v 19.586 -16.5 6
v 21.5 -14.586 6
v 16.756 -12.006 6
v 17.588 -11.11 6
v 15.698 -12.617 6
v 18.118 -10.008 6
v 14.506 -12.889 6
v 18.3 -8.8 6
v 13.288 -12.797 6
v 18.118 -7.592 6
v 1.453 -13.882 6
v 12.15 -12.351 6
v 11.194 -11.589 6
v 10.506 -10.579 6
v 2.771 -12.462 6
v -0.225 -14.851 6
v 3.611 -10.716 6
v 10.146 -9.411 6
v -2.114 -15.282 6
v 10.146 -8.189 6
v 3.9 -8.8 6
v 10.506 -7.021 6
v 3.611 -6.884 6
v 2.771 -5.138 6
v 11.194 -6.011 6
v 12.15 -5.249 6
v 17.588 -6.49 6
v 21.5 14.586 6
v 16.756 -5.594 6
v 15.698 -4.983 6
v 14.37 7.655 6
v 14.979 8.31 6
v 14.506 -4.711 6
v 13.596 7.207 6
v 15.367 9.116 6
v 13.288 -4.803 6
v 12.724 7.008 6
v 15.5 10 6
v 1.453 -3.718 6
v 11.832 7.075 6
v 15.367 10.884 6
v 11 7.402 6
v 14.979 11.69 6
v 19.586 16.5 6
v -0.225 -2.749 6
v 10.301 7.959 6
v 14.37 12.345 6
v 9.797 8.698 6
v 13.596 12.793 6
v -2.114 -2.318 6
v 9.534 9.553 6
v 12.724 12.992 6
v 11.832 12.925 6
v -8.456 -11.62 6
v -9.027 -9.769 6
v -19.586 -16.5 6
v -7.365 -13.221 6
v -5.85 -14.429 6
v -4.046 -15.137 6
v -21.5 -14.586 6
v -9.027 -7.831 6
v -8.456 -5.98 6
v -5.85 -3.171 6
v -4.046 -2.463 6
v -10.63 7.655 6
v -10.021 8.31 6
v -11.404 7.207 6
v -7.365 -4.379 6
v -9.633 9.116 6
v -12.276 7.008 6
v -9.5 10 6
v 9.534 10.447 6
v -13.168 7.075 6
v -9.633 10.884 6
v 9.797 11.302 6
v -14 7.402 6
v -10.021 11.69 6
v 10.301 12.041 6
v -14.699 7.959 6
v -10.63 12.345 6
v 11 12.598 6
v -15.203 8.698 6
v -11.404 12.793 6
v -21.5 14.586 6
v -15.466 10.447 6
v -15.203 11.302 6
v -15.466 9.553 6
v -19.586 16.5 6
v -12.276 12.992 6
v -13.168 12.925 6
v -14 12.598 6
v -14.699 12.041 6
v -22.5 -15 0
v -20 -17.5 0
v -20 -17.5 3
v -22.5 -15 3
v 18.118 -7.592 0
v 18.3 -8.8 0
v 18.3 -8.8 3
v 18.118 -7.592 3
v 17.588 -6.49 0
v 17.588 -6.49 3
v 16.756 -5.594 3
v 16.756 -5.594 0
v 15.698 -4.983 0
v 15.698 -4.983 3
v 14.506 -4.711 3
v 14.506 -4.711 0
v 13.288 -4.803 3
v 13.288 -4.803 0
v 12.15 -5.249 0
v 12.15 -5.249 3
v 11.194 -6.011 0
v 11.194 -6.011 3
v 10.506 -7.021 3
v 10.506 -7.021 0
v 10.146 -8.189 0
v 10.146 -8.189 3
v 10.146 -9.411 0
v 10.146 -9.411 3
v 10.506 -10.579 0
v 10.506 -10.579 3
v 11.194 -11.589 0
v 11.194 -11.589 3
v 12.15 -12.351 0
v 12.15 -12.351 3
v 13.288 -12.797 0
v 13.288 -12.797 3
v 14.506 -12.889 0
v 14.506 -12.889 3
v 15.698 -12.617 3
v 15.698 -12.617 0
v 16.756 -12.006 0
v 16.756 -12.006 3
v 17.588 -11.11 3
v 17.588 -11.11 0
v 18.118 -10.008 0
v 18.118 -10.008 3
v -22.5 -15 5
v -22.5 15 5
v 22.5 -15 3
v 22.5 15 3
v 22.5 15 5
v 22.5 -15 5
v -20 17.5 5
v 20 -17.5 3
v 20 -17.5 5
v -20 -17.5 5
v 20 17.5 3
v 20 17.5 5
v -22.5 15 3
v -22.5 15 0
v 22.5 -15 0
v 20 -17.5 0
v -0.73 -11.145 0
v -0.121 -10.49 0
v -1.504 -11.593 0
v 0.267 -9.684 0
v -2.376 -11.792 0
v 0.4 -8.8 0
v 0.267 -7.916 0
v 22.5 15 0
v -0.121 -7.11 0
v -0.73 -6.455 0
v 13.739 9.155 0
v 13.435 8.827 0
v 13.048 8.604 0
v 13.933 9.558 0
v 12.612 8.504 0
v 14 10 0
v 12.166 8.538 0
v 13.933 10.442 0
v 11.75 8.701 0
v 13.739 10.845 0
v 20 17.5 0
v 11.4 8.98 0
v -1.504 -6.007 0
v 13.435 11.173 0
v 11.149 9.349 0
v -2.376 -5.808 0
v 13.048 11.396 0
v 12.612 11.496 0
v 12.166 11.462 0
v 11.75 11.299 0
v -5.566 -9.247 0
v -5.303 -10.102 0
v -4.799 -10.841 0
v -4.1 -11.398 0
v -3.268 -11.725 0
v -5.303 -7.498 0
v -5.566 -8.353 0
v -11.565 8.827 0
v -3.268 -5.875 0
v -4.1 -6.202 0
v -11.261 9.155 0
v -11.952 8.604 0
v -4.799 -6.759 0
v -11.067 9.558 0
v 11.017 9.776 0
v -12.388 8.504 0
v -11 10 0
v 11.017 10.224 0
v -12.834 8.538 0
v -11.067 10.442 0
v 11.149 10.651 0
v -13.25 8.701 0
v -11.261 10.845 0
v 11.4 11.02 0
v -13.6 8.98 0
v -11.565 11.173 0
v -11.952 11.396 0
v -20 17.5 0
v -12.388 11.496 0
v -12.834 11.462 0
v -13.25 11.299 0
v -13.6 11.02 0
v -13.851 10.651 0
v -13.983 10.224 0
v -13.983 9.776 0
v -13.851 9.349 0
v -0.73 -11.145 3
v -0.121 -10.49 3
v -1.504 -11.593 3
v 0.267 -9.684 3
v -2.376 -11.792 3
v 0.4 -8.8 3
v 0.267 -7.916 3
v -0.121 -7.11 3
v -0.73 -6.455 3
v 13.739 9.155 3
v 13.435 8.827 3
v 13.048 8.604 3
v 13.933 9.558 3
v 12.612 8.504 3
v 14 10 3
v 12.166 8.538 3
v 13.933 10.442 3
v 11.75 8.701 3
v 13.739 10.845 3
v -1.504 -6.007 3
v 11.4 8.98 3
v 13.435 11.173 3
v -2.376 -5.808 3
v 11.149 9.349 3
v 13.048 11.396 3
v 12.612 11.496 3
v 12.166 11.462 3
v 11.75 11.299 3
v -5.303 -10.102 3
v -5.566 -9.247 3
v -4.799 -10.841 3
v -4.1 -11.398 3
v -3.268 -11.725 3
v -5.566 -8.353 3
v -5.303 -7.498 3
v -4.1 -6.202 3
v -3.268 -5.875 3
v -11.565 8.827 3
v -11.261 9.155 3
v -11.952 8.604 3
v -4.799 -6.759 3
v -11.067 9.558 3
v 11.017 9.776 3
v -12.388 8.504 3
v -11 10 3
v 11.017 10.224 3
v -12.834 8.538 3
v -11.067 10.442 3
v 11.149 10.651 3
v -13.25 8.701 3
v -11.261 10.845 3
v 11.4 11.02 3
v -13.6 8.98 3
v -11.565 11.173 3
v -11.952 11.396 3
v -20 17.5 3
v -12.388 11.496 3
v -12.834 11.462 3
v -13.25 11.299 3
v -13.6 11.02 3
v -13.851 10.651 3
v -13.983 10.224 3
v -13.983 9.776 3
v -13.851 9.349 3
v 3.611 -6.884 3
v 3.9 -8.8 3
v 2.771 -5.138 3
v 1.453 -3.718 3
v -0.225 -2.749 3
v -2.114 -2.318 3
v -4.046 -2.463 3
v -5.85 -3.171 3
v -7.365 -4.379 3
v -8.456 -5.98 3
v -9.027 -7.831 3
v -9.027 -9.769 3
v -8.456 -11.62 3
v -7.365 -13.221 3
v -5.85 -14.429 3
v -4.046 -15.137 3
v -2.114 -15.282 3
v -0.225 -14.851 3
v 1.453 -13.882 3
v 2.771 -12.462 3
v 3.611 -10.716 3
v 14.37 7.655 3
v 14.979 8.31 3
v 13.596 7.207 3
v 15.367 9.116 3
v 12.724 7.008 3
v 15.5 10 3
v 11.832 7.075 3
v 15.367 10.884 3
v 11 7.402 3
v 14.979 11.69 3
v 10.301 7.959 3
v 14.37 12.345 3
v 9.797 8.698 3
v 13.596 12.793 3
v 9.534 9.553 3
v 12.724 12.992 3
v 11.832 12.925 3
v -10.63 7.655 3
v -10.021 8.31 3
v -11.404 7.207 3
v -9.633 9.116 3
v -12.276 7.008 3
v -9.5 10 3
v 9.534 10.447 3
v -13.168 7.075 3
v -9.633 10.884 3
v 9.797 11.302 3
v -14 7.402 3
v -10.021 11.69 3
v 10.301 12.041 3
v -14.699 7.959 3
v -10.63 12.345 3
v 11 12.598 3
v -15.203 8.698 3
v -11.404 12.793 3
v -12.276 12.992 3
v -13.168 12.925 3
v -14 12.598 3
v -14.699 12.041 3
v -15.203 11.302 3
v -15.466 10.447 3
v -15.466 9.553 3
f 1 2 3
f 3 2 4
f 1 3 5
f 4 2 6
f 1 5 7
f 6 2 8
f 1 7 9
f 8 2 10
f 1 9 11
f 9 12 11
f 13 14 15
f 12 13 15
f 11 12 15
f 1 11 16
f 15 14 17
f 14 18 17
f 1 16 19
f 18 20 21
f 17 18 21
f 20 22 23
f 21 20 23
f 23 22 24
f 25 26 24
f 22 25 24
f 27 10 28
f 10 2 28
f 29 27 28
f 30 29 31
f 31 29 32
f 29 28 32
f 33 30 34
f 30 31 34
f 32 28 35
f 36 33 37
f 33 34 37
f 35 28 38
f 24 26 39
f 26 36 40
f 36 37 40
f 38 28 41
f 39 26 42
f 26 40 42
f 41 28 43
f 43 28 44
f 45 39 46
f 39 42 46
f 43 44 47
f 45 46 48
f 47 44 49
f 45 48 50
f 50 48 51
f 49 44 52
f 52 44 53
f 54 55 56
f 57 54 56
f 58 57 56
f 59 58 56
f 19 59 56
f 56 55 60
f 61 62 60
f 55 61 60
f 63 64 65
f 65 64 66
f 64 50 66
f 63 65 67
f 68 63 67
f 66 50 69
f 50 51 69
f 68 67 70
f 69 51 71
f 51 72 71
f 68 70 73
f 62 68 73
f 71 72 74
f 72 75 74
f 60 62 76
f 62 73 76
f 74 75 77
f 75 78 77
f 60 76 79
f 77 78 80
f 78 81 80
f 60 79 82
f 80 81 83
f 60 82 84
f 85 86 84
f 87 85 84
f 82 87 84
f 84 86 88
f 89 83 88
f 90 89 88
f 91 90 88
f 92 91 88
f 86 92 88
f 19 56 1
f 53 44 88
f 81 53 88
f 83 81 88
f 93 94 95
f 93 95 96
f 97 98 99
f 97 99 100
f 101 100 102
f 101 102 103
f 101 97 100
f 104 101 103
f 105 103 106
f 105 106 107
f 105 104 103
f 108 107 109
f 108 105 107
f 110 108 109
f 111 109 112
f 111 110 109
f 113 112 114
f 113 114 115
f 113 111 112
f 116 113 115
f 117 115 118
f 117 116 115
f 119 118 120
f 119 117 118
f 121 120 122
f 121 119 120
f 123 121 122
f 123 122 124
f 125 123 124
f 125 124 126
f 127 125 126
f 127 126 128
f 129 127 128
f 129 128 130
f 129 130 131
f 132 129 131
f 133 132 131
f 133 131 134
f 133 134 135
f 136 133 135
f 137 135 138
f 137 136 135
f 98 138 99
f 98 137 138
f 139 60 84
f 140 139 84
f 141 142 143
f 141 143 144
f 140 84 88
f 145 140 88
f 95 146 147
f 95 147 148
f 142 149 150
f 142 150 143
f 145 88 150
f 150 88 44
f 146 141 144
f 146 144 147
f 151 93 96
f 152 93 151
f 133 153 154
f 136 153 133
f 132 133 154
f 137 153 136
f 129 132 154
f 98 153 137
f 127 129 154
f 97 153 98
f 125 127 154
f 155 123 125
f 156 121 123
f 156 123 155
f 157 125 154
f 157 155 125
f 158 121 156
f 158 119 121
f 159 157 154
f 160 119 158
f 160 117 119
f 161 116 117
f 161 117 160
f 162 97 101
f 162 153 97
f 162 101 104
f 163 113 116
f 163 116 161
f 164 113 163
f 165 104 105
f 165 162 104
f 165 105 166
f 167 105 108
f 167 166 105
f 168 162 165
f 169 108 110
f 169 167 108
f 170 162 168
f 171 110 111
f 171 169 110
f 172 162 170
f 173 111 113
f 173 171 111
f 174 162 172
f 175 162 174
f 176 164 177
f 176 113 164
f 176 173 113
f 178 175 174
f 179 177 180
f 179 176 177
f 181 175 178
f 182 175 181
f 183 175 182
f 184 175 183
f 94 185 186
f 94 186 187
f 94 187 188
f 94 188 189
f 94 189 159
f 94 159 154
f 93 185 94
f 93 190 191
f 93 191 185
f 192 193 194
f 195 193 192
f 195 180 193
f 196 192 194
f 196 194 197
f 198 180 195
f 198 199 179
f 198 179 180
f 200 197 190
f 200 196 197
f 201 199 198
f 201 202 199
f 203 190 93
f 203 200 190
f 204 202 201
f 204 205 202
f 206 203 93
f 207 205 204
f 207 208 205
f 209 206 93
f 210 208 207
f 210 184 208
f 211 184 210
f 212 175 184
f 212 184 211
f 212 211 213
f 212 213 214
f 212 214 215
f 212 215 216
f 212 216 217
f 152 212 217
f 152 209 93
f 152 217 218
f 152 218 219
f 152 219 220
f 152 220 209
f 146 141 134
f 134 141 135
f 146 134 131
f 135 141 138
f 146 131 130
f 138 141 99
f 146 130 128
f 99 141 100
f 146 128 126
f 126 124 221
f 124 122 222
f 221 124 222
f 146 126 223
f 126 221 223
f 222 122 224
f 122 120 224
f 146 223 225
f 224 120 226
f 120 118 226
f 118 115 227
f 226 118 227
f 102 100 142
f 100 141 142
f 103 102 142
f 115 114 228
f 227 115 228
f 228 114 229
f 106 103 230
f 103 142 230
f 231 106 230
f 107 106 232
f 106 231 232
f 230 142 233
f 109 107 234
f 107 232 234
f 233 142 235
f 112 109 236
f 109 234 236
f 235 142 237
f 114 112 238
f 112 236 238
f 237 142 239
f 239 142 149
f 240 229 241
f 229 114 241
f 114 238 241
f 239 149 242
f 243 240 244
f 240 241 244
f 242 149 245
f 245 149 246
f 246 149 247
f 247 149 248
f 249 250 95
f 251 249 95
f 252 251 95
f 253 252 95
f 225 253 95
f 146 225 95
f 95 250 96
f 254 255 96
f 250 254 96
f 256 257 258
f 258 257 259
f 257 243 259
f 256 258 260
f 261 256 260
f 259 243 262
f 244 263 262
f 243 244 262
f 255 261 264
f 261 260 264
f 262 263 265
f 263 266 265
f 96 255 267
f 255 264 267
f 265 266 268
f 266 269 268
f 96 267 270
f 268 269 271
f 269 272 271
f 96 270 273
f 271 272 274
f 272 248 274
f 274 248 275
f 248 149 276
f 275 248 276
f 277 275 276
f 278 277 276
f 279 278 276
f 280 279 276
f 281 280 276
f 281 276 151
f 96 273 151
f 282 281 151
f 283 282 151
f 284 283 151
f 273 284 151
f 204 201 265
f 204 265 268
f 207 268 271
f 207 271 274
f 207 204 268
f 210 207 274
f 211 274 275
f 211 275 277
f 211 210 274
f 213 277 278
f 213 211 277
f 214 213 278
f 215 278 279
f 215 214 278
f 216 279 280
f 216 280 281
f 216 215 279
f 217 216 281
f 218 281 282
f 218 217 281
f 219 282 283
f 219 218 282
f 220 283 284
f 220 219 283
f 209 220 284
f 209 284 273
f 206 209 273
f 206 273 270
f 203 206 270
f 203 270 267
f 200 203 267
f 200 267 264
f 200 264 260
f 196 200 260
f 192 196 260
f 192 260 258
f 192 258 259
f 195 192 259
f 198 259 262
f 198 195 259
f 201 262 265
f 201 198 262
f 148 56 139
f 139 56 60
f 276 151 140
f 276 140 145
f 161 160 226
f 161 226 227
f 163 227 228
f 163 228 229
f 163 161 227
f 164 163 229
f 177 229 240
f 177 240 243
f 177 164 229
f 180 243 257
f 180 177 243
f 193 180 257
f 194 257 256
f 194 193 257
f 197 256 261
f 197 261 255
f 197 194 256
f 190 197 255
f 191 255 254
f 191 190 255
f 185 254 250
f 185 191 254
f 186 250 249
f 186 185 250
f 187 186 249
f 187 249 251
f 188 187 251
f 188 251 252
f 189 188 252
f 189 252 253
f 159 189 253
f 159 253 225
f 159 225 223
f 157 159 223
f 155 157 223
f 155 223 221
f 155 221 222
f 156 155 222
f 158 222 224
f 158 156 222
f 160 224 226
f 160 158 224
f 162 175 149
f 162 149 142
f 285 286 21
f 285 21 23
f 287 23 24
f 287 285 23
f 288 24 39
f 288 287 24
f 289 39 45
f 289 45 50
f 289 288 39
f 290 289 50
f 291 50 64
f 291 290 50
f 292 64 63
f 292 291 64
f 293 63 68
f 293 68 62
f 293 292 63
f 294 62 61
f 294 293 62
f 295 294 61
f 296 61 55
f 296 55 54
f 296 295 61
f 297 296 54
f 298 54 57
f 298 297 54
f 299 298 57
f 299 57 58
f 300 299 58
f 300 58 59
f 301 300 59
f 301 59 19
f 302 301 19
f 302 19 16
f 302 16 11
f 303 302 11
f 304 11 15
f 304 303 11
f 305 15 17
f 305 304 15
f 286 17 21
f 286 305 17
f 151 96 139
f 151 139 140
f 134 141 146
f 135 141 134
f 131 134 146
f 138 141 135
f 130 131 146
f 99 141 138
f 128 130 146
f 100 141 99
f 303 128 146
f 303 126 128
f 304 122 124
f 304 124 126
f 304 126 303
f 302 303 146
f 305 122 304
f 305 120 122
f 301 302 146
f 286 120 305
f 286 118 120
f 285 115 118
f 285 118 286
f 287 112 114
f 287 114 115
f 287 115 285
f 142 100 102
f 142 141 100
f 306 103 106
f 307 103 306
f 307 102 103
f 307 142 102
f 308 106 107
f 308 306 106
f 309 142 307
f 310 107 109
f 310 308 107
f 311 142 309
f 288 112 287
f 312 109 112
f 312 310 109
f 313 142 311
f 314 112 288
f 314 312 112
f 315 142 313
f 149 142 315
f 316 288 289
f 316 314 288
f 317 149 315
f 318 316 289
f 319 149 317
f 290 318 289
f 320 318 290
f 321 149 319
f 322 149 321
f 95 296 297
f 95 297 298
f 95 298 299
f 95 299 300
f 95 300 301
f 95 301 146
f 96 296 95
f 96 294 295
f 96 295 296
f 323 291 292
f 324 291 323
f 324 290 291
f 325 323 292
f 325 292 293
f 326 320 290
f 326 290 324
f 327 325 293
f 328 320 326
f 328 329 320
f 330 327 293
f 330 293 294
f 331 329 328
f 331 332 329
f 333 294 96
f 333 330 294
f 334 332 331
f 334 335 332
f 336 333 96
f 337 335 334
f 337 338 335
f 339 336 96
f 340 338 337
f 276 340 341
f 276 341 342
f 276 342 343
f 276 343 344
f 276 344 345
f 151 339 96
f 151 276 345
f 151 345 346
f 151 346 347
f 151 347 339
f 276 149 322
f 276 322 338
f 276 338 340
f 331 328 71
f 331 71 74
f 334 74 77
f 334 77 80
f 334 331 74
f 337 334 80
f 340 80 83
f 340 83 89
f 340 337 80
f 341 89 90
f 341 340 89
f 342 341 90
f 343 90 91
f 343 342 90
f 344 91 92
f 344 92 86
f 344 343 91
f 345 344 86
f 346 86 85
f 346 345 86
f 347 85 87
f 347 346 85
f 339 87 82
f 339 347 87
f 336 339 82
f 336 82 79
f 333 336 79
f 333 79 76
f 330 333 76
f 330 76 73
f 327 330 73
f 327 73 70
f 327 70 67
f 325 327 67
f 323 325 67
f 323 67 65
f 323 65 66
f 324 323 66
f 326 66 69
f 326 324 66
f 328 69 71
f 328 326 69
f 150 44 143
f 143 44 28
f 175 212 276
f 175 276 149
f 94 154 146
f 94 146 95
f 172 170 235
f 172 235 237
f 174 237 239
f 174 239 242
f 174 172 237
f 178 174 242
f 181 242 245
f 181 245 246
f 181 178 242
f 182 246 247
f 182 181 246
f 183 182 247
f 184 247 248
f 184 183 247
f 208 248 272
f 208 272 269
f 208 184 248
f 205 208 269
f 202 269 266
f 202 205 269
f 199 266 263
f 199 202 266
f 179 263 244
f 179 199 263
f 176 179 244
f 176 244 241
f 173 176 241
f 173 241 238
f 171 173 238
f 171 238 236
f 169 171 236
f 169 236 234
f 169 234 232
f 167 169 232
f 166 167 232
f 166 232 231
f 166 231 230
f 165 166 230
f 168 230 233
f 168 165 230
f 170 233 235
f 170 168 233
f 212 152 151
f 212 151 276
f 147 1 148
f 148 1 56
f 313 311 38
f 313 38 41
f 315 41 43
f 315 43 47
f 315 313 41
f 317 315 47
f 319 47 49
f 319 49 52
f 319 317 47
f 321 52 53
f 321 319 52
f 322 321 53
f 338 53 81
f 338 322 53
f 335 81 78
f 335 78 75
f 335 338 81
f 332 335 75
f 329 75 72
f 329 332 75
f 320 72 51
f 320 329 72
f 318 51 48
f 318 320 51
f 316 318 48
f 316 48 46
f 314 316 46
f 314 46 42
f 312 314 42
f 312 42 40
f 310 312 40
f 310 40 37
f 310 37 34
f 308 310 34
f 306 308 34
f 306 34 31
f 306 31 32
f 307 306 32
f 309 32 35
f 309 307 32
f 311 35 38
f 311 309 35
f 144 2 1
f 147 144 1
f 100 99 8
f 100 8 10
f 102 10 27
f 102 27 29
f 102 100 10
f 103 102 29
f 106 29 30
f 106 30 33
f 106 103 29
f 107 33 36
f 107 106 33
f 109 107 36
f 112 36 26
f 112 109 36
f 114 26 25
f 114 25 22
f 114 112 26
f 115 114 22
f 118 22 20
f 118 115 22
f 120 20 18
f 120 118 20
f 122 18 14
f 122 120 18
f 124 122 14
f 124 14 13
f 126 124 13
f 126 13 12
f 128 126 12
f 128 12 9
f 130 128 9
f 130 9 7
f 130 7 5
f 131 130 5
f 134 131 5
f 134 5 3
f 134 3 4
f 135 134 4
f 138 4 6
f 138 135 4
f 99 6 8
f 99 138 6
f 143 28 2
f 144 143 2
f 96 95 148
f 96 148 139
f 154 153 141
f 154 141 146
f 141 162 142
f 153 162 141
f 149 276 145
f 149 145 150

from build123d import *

# Parameters (mm, degrees)
SKETCH_R      = 4.1
SKETCH_R_2    = 3
SKETCH_R_3    = 1.5
PAD_DEPTH     = 3
SKETCH001_R   = 4.1
SKETCH001_R_2 = 6.5
SKETCH001_R_3 = 3
PAD001_DEPTH  = 3
CHAMFER_SIZE  = 1


with BuildPart() as base_pad:
    # Sketch → Pad (new body)
    with BuildSketch(Plane.XY):
        Polygon((-20, 17.5), (20, 17.5), (22.5, 15), (22.5, -15), (20, -17.5), (-20, -17.5), (-22.5, -15), (-22.5, 15), align=None)
        with Locations((14.2, -8.8)):
            Circle(SKETCH_R, mode=Mode.SUBTRACT)
        with Locations((-2.6, -8.8)):
            Circle(SKETCH_R_2, mode=Mode.SUBTRACT)
        with Locations((12.5, 10)):
            Circle(SKETCH_R_3, mode=Mode.SUBTRACT)
        with Locations((-12.5, 10)):
            Circle(SKETCH_R_3, mode=Mode.SUBTRACT)
    extrude(amount=PAD_DEPTH)


with BuildPart() as chamfer_body:
    # Sketch001 → Pad001 (new body)
    with BuildSketch(Plane.XY.offset(3)):
        Polygon((-20, 17.5), (20, 17.5), (22.5, 15), (22.5, -15), (20, -17.5), (-20, -17.5), (-22.5, -15), (-22.5, 15), align=None)
        with Locations((14.2, -8.8)):
            Circle(SKETCH001_R, mode=Mode.SUBTRACT)
        with Locations((-2.6, -8.8)):
            Circle(SKETCH001_R_2, mode=Mode.SUBTRACT)
        with Locations((12.5, 10)):
            Circle(SKETCH001_R_3, mode=Mode.SUBTRACT)
        with Locations((-12.5, 10)):
            Circle(SKETCH001_R_3, mode=Mode.SUBTRACT)
    extrude(amount=PAD001_DEPTH)

    # Chamfer
    chamfer_edges = [chamfer_body.edges().sort_by_distance(p)[0] for p in [
        (0, -17.5, 6),
        (21.25, -16.25, 6),
        (22.5, 0, 6),
        (0, 17.5, 6),
        (21.25, 16.25, 6),
        (-21.25, 16.25, 6),
        (-22.5, 0, 6),
        (-21.25, -16.25, 6),
    ]]
    chamfer(chamfer_edges, length=CHAMFER_SIZE)


solid = Compound([base_pad.part, chamfer_body.part])
